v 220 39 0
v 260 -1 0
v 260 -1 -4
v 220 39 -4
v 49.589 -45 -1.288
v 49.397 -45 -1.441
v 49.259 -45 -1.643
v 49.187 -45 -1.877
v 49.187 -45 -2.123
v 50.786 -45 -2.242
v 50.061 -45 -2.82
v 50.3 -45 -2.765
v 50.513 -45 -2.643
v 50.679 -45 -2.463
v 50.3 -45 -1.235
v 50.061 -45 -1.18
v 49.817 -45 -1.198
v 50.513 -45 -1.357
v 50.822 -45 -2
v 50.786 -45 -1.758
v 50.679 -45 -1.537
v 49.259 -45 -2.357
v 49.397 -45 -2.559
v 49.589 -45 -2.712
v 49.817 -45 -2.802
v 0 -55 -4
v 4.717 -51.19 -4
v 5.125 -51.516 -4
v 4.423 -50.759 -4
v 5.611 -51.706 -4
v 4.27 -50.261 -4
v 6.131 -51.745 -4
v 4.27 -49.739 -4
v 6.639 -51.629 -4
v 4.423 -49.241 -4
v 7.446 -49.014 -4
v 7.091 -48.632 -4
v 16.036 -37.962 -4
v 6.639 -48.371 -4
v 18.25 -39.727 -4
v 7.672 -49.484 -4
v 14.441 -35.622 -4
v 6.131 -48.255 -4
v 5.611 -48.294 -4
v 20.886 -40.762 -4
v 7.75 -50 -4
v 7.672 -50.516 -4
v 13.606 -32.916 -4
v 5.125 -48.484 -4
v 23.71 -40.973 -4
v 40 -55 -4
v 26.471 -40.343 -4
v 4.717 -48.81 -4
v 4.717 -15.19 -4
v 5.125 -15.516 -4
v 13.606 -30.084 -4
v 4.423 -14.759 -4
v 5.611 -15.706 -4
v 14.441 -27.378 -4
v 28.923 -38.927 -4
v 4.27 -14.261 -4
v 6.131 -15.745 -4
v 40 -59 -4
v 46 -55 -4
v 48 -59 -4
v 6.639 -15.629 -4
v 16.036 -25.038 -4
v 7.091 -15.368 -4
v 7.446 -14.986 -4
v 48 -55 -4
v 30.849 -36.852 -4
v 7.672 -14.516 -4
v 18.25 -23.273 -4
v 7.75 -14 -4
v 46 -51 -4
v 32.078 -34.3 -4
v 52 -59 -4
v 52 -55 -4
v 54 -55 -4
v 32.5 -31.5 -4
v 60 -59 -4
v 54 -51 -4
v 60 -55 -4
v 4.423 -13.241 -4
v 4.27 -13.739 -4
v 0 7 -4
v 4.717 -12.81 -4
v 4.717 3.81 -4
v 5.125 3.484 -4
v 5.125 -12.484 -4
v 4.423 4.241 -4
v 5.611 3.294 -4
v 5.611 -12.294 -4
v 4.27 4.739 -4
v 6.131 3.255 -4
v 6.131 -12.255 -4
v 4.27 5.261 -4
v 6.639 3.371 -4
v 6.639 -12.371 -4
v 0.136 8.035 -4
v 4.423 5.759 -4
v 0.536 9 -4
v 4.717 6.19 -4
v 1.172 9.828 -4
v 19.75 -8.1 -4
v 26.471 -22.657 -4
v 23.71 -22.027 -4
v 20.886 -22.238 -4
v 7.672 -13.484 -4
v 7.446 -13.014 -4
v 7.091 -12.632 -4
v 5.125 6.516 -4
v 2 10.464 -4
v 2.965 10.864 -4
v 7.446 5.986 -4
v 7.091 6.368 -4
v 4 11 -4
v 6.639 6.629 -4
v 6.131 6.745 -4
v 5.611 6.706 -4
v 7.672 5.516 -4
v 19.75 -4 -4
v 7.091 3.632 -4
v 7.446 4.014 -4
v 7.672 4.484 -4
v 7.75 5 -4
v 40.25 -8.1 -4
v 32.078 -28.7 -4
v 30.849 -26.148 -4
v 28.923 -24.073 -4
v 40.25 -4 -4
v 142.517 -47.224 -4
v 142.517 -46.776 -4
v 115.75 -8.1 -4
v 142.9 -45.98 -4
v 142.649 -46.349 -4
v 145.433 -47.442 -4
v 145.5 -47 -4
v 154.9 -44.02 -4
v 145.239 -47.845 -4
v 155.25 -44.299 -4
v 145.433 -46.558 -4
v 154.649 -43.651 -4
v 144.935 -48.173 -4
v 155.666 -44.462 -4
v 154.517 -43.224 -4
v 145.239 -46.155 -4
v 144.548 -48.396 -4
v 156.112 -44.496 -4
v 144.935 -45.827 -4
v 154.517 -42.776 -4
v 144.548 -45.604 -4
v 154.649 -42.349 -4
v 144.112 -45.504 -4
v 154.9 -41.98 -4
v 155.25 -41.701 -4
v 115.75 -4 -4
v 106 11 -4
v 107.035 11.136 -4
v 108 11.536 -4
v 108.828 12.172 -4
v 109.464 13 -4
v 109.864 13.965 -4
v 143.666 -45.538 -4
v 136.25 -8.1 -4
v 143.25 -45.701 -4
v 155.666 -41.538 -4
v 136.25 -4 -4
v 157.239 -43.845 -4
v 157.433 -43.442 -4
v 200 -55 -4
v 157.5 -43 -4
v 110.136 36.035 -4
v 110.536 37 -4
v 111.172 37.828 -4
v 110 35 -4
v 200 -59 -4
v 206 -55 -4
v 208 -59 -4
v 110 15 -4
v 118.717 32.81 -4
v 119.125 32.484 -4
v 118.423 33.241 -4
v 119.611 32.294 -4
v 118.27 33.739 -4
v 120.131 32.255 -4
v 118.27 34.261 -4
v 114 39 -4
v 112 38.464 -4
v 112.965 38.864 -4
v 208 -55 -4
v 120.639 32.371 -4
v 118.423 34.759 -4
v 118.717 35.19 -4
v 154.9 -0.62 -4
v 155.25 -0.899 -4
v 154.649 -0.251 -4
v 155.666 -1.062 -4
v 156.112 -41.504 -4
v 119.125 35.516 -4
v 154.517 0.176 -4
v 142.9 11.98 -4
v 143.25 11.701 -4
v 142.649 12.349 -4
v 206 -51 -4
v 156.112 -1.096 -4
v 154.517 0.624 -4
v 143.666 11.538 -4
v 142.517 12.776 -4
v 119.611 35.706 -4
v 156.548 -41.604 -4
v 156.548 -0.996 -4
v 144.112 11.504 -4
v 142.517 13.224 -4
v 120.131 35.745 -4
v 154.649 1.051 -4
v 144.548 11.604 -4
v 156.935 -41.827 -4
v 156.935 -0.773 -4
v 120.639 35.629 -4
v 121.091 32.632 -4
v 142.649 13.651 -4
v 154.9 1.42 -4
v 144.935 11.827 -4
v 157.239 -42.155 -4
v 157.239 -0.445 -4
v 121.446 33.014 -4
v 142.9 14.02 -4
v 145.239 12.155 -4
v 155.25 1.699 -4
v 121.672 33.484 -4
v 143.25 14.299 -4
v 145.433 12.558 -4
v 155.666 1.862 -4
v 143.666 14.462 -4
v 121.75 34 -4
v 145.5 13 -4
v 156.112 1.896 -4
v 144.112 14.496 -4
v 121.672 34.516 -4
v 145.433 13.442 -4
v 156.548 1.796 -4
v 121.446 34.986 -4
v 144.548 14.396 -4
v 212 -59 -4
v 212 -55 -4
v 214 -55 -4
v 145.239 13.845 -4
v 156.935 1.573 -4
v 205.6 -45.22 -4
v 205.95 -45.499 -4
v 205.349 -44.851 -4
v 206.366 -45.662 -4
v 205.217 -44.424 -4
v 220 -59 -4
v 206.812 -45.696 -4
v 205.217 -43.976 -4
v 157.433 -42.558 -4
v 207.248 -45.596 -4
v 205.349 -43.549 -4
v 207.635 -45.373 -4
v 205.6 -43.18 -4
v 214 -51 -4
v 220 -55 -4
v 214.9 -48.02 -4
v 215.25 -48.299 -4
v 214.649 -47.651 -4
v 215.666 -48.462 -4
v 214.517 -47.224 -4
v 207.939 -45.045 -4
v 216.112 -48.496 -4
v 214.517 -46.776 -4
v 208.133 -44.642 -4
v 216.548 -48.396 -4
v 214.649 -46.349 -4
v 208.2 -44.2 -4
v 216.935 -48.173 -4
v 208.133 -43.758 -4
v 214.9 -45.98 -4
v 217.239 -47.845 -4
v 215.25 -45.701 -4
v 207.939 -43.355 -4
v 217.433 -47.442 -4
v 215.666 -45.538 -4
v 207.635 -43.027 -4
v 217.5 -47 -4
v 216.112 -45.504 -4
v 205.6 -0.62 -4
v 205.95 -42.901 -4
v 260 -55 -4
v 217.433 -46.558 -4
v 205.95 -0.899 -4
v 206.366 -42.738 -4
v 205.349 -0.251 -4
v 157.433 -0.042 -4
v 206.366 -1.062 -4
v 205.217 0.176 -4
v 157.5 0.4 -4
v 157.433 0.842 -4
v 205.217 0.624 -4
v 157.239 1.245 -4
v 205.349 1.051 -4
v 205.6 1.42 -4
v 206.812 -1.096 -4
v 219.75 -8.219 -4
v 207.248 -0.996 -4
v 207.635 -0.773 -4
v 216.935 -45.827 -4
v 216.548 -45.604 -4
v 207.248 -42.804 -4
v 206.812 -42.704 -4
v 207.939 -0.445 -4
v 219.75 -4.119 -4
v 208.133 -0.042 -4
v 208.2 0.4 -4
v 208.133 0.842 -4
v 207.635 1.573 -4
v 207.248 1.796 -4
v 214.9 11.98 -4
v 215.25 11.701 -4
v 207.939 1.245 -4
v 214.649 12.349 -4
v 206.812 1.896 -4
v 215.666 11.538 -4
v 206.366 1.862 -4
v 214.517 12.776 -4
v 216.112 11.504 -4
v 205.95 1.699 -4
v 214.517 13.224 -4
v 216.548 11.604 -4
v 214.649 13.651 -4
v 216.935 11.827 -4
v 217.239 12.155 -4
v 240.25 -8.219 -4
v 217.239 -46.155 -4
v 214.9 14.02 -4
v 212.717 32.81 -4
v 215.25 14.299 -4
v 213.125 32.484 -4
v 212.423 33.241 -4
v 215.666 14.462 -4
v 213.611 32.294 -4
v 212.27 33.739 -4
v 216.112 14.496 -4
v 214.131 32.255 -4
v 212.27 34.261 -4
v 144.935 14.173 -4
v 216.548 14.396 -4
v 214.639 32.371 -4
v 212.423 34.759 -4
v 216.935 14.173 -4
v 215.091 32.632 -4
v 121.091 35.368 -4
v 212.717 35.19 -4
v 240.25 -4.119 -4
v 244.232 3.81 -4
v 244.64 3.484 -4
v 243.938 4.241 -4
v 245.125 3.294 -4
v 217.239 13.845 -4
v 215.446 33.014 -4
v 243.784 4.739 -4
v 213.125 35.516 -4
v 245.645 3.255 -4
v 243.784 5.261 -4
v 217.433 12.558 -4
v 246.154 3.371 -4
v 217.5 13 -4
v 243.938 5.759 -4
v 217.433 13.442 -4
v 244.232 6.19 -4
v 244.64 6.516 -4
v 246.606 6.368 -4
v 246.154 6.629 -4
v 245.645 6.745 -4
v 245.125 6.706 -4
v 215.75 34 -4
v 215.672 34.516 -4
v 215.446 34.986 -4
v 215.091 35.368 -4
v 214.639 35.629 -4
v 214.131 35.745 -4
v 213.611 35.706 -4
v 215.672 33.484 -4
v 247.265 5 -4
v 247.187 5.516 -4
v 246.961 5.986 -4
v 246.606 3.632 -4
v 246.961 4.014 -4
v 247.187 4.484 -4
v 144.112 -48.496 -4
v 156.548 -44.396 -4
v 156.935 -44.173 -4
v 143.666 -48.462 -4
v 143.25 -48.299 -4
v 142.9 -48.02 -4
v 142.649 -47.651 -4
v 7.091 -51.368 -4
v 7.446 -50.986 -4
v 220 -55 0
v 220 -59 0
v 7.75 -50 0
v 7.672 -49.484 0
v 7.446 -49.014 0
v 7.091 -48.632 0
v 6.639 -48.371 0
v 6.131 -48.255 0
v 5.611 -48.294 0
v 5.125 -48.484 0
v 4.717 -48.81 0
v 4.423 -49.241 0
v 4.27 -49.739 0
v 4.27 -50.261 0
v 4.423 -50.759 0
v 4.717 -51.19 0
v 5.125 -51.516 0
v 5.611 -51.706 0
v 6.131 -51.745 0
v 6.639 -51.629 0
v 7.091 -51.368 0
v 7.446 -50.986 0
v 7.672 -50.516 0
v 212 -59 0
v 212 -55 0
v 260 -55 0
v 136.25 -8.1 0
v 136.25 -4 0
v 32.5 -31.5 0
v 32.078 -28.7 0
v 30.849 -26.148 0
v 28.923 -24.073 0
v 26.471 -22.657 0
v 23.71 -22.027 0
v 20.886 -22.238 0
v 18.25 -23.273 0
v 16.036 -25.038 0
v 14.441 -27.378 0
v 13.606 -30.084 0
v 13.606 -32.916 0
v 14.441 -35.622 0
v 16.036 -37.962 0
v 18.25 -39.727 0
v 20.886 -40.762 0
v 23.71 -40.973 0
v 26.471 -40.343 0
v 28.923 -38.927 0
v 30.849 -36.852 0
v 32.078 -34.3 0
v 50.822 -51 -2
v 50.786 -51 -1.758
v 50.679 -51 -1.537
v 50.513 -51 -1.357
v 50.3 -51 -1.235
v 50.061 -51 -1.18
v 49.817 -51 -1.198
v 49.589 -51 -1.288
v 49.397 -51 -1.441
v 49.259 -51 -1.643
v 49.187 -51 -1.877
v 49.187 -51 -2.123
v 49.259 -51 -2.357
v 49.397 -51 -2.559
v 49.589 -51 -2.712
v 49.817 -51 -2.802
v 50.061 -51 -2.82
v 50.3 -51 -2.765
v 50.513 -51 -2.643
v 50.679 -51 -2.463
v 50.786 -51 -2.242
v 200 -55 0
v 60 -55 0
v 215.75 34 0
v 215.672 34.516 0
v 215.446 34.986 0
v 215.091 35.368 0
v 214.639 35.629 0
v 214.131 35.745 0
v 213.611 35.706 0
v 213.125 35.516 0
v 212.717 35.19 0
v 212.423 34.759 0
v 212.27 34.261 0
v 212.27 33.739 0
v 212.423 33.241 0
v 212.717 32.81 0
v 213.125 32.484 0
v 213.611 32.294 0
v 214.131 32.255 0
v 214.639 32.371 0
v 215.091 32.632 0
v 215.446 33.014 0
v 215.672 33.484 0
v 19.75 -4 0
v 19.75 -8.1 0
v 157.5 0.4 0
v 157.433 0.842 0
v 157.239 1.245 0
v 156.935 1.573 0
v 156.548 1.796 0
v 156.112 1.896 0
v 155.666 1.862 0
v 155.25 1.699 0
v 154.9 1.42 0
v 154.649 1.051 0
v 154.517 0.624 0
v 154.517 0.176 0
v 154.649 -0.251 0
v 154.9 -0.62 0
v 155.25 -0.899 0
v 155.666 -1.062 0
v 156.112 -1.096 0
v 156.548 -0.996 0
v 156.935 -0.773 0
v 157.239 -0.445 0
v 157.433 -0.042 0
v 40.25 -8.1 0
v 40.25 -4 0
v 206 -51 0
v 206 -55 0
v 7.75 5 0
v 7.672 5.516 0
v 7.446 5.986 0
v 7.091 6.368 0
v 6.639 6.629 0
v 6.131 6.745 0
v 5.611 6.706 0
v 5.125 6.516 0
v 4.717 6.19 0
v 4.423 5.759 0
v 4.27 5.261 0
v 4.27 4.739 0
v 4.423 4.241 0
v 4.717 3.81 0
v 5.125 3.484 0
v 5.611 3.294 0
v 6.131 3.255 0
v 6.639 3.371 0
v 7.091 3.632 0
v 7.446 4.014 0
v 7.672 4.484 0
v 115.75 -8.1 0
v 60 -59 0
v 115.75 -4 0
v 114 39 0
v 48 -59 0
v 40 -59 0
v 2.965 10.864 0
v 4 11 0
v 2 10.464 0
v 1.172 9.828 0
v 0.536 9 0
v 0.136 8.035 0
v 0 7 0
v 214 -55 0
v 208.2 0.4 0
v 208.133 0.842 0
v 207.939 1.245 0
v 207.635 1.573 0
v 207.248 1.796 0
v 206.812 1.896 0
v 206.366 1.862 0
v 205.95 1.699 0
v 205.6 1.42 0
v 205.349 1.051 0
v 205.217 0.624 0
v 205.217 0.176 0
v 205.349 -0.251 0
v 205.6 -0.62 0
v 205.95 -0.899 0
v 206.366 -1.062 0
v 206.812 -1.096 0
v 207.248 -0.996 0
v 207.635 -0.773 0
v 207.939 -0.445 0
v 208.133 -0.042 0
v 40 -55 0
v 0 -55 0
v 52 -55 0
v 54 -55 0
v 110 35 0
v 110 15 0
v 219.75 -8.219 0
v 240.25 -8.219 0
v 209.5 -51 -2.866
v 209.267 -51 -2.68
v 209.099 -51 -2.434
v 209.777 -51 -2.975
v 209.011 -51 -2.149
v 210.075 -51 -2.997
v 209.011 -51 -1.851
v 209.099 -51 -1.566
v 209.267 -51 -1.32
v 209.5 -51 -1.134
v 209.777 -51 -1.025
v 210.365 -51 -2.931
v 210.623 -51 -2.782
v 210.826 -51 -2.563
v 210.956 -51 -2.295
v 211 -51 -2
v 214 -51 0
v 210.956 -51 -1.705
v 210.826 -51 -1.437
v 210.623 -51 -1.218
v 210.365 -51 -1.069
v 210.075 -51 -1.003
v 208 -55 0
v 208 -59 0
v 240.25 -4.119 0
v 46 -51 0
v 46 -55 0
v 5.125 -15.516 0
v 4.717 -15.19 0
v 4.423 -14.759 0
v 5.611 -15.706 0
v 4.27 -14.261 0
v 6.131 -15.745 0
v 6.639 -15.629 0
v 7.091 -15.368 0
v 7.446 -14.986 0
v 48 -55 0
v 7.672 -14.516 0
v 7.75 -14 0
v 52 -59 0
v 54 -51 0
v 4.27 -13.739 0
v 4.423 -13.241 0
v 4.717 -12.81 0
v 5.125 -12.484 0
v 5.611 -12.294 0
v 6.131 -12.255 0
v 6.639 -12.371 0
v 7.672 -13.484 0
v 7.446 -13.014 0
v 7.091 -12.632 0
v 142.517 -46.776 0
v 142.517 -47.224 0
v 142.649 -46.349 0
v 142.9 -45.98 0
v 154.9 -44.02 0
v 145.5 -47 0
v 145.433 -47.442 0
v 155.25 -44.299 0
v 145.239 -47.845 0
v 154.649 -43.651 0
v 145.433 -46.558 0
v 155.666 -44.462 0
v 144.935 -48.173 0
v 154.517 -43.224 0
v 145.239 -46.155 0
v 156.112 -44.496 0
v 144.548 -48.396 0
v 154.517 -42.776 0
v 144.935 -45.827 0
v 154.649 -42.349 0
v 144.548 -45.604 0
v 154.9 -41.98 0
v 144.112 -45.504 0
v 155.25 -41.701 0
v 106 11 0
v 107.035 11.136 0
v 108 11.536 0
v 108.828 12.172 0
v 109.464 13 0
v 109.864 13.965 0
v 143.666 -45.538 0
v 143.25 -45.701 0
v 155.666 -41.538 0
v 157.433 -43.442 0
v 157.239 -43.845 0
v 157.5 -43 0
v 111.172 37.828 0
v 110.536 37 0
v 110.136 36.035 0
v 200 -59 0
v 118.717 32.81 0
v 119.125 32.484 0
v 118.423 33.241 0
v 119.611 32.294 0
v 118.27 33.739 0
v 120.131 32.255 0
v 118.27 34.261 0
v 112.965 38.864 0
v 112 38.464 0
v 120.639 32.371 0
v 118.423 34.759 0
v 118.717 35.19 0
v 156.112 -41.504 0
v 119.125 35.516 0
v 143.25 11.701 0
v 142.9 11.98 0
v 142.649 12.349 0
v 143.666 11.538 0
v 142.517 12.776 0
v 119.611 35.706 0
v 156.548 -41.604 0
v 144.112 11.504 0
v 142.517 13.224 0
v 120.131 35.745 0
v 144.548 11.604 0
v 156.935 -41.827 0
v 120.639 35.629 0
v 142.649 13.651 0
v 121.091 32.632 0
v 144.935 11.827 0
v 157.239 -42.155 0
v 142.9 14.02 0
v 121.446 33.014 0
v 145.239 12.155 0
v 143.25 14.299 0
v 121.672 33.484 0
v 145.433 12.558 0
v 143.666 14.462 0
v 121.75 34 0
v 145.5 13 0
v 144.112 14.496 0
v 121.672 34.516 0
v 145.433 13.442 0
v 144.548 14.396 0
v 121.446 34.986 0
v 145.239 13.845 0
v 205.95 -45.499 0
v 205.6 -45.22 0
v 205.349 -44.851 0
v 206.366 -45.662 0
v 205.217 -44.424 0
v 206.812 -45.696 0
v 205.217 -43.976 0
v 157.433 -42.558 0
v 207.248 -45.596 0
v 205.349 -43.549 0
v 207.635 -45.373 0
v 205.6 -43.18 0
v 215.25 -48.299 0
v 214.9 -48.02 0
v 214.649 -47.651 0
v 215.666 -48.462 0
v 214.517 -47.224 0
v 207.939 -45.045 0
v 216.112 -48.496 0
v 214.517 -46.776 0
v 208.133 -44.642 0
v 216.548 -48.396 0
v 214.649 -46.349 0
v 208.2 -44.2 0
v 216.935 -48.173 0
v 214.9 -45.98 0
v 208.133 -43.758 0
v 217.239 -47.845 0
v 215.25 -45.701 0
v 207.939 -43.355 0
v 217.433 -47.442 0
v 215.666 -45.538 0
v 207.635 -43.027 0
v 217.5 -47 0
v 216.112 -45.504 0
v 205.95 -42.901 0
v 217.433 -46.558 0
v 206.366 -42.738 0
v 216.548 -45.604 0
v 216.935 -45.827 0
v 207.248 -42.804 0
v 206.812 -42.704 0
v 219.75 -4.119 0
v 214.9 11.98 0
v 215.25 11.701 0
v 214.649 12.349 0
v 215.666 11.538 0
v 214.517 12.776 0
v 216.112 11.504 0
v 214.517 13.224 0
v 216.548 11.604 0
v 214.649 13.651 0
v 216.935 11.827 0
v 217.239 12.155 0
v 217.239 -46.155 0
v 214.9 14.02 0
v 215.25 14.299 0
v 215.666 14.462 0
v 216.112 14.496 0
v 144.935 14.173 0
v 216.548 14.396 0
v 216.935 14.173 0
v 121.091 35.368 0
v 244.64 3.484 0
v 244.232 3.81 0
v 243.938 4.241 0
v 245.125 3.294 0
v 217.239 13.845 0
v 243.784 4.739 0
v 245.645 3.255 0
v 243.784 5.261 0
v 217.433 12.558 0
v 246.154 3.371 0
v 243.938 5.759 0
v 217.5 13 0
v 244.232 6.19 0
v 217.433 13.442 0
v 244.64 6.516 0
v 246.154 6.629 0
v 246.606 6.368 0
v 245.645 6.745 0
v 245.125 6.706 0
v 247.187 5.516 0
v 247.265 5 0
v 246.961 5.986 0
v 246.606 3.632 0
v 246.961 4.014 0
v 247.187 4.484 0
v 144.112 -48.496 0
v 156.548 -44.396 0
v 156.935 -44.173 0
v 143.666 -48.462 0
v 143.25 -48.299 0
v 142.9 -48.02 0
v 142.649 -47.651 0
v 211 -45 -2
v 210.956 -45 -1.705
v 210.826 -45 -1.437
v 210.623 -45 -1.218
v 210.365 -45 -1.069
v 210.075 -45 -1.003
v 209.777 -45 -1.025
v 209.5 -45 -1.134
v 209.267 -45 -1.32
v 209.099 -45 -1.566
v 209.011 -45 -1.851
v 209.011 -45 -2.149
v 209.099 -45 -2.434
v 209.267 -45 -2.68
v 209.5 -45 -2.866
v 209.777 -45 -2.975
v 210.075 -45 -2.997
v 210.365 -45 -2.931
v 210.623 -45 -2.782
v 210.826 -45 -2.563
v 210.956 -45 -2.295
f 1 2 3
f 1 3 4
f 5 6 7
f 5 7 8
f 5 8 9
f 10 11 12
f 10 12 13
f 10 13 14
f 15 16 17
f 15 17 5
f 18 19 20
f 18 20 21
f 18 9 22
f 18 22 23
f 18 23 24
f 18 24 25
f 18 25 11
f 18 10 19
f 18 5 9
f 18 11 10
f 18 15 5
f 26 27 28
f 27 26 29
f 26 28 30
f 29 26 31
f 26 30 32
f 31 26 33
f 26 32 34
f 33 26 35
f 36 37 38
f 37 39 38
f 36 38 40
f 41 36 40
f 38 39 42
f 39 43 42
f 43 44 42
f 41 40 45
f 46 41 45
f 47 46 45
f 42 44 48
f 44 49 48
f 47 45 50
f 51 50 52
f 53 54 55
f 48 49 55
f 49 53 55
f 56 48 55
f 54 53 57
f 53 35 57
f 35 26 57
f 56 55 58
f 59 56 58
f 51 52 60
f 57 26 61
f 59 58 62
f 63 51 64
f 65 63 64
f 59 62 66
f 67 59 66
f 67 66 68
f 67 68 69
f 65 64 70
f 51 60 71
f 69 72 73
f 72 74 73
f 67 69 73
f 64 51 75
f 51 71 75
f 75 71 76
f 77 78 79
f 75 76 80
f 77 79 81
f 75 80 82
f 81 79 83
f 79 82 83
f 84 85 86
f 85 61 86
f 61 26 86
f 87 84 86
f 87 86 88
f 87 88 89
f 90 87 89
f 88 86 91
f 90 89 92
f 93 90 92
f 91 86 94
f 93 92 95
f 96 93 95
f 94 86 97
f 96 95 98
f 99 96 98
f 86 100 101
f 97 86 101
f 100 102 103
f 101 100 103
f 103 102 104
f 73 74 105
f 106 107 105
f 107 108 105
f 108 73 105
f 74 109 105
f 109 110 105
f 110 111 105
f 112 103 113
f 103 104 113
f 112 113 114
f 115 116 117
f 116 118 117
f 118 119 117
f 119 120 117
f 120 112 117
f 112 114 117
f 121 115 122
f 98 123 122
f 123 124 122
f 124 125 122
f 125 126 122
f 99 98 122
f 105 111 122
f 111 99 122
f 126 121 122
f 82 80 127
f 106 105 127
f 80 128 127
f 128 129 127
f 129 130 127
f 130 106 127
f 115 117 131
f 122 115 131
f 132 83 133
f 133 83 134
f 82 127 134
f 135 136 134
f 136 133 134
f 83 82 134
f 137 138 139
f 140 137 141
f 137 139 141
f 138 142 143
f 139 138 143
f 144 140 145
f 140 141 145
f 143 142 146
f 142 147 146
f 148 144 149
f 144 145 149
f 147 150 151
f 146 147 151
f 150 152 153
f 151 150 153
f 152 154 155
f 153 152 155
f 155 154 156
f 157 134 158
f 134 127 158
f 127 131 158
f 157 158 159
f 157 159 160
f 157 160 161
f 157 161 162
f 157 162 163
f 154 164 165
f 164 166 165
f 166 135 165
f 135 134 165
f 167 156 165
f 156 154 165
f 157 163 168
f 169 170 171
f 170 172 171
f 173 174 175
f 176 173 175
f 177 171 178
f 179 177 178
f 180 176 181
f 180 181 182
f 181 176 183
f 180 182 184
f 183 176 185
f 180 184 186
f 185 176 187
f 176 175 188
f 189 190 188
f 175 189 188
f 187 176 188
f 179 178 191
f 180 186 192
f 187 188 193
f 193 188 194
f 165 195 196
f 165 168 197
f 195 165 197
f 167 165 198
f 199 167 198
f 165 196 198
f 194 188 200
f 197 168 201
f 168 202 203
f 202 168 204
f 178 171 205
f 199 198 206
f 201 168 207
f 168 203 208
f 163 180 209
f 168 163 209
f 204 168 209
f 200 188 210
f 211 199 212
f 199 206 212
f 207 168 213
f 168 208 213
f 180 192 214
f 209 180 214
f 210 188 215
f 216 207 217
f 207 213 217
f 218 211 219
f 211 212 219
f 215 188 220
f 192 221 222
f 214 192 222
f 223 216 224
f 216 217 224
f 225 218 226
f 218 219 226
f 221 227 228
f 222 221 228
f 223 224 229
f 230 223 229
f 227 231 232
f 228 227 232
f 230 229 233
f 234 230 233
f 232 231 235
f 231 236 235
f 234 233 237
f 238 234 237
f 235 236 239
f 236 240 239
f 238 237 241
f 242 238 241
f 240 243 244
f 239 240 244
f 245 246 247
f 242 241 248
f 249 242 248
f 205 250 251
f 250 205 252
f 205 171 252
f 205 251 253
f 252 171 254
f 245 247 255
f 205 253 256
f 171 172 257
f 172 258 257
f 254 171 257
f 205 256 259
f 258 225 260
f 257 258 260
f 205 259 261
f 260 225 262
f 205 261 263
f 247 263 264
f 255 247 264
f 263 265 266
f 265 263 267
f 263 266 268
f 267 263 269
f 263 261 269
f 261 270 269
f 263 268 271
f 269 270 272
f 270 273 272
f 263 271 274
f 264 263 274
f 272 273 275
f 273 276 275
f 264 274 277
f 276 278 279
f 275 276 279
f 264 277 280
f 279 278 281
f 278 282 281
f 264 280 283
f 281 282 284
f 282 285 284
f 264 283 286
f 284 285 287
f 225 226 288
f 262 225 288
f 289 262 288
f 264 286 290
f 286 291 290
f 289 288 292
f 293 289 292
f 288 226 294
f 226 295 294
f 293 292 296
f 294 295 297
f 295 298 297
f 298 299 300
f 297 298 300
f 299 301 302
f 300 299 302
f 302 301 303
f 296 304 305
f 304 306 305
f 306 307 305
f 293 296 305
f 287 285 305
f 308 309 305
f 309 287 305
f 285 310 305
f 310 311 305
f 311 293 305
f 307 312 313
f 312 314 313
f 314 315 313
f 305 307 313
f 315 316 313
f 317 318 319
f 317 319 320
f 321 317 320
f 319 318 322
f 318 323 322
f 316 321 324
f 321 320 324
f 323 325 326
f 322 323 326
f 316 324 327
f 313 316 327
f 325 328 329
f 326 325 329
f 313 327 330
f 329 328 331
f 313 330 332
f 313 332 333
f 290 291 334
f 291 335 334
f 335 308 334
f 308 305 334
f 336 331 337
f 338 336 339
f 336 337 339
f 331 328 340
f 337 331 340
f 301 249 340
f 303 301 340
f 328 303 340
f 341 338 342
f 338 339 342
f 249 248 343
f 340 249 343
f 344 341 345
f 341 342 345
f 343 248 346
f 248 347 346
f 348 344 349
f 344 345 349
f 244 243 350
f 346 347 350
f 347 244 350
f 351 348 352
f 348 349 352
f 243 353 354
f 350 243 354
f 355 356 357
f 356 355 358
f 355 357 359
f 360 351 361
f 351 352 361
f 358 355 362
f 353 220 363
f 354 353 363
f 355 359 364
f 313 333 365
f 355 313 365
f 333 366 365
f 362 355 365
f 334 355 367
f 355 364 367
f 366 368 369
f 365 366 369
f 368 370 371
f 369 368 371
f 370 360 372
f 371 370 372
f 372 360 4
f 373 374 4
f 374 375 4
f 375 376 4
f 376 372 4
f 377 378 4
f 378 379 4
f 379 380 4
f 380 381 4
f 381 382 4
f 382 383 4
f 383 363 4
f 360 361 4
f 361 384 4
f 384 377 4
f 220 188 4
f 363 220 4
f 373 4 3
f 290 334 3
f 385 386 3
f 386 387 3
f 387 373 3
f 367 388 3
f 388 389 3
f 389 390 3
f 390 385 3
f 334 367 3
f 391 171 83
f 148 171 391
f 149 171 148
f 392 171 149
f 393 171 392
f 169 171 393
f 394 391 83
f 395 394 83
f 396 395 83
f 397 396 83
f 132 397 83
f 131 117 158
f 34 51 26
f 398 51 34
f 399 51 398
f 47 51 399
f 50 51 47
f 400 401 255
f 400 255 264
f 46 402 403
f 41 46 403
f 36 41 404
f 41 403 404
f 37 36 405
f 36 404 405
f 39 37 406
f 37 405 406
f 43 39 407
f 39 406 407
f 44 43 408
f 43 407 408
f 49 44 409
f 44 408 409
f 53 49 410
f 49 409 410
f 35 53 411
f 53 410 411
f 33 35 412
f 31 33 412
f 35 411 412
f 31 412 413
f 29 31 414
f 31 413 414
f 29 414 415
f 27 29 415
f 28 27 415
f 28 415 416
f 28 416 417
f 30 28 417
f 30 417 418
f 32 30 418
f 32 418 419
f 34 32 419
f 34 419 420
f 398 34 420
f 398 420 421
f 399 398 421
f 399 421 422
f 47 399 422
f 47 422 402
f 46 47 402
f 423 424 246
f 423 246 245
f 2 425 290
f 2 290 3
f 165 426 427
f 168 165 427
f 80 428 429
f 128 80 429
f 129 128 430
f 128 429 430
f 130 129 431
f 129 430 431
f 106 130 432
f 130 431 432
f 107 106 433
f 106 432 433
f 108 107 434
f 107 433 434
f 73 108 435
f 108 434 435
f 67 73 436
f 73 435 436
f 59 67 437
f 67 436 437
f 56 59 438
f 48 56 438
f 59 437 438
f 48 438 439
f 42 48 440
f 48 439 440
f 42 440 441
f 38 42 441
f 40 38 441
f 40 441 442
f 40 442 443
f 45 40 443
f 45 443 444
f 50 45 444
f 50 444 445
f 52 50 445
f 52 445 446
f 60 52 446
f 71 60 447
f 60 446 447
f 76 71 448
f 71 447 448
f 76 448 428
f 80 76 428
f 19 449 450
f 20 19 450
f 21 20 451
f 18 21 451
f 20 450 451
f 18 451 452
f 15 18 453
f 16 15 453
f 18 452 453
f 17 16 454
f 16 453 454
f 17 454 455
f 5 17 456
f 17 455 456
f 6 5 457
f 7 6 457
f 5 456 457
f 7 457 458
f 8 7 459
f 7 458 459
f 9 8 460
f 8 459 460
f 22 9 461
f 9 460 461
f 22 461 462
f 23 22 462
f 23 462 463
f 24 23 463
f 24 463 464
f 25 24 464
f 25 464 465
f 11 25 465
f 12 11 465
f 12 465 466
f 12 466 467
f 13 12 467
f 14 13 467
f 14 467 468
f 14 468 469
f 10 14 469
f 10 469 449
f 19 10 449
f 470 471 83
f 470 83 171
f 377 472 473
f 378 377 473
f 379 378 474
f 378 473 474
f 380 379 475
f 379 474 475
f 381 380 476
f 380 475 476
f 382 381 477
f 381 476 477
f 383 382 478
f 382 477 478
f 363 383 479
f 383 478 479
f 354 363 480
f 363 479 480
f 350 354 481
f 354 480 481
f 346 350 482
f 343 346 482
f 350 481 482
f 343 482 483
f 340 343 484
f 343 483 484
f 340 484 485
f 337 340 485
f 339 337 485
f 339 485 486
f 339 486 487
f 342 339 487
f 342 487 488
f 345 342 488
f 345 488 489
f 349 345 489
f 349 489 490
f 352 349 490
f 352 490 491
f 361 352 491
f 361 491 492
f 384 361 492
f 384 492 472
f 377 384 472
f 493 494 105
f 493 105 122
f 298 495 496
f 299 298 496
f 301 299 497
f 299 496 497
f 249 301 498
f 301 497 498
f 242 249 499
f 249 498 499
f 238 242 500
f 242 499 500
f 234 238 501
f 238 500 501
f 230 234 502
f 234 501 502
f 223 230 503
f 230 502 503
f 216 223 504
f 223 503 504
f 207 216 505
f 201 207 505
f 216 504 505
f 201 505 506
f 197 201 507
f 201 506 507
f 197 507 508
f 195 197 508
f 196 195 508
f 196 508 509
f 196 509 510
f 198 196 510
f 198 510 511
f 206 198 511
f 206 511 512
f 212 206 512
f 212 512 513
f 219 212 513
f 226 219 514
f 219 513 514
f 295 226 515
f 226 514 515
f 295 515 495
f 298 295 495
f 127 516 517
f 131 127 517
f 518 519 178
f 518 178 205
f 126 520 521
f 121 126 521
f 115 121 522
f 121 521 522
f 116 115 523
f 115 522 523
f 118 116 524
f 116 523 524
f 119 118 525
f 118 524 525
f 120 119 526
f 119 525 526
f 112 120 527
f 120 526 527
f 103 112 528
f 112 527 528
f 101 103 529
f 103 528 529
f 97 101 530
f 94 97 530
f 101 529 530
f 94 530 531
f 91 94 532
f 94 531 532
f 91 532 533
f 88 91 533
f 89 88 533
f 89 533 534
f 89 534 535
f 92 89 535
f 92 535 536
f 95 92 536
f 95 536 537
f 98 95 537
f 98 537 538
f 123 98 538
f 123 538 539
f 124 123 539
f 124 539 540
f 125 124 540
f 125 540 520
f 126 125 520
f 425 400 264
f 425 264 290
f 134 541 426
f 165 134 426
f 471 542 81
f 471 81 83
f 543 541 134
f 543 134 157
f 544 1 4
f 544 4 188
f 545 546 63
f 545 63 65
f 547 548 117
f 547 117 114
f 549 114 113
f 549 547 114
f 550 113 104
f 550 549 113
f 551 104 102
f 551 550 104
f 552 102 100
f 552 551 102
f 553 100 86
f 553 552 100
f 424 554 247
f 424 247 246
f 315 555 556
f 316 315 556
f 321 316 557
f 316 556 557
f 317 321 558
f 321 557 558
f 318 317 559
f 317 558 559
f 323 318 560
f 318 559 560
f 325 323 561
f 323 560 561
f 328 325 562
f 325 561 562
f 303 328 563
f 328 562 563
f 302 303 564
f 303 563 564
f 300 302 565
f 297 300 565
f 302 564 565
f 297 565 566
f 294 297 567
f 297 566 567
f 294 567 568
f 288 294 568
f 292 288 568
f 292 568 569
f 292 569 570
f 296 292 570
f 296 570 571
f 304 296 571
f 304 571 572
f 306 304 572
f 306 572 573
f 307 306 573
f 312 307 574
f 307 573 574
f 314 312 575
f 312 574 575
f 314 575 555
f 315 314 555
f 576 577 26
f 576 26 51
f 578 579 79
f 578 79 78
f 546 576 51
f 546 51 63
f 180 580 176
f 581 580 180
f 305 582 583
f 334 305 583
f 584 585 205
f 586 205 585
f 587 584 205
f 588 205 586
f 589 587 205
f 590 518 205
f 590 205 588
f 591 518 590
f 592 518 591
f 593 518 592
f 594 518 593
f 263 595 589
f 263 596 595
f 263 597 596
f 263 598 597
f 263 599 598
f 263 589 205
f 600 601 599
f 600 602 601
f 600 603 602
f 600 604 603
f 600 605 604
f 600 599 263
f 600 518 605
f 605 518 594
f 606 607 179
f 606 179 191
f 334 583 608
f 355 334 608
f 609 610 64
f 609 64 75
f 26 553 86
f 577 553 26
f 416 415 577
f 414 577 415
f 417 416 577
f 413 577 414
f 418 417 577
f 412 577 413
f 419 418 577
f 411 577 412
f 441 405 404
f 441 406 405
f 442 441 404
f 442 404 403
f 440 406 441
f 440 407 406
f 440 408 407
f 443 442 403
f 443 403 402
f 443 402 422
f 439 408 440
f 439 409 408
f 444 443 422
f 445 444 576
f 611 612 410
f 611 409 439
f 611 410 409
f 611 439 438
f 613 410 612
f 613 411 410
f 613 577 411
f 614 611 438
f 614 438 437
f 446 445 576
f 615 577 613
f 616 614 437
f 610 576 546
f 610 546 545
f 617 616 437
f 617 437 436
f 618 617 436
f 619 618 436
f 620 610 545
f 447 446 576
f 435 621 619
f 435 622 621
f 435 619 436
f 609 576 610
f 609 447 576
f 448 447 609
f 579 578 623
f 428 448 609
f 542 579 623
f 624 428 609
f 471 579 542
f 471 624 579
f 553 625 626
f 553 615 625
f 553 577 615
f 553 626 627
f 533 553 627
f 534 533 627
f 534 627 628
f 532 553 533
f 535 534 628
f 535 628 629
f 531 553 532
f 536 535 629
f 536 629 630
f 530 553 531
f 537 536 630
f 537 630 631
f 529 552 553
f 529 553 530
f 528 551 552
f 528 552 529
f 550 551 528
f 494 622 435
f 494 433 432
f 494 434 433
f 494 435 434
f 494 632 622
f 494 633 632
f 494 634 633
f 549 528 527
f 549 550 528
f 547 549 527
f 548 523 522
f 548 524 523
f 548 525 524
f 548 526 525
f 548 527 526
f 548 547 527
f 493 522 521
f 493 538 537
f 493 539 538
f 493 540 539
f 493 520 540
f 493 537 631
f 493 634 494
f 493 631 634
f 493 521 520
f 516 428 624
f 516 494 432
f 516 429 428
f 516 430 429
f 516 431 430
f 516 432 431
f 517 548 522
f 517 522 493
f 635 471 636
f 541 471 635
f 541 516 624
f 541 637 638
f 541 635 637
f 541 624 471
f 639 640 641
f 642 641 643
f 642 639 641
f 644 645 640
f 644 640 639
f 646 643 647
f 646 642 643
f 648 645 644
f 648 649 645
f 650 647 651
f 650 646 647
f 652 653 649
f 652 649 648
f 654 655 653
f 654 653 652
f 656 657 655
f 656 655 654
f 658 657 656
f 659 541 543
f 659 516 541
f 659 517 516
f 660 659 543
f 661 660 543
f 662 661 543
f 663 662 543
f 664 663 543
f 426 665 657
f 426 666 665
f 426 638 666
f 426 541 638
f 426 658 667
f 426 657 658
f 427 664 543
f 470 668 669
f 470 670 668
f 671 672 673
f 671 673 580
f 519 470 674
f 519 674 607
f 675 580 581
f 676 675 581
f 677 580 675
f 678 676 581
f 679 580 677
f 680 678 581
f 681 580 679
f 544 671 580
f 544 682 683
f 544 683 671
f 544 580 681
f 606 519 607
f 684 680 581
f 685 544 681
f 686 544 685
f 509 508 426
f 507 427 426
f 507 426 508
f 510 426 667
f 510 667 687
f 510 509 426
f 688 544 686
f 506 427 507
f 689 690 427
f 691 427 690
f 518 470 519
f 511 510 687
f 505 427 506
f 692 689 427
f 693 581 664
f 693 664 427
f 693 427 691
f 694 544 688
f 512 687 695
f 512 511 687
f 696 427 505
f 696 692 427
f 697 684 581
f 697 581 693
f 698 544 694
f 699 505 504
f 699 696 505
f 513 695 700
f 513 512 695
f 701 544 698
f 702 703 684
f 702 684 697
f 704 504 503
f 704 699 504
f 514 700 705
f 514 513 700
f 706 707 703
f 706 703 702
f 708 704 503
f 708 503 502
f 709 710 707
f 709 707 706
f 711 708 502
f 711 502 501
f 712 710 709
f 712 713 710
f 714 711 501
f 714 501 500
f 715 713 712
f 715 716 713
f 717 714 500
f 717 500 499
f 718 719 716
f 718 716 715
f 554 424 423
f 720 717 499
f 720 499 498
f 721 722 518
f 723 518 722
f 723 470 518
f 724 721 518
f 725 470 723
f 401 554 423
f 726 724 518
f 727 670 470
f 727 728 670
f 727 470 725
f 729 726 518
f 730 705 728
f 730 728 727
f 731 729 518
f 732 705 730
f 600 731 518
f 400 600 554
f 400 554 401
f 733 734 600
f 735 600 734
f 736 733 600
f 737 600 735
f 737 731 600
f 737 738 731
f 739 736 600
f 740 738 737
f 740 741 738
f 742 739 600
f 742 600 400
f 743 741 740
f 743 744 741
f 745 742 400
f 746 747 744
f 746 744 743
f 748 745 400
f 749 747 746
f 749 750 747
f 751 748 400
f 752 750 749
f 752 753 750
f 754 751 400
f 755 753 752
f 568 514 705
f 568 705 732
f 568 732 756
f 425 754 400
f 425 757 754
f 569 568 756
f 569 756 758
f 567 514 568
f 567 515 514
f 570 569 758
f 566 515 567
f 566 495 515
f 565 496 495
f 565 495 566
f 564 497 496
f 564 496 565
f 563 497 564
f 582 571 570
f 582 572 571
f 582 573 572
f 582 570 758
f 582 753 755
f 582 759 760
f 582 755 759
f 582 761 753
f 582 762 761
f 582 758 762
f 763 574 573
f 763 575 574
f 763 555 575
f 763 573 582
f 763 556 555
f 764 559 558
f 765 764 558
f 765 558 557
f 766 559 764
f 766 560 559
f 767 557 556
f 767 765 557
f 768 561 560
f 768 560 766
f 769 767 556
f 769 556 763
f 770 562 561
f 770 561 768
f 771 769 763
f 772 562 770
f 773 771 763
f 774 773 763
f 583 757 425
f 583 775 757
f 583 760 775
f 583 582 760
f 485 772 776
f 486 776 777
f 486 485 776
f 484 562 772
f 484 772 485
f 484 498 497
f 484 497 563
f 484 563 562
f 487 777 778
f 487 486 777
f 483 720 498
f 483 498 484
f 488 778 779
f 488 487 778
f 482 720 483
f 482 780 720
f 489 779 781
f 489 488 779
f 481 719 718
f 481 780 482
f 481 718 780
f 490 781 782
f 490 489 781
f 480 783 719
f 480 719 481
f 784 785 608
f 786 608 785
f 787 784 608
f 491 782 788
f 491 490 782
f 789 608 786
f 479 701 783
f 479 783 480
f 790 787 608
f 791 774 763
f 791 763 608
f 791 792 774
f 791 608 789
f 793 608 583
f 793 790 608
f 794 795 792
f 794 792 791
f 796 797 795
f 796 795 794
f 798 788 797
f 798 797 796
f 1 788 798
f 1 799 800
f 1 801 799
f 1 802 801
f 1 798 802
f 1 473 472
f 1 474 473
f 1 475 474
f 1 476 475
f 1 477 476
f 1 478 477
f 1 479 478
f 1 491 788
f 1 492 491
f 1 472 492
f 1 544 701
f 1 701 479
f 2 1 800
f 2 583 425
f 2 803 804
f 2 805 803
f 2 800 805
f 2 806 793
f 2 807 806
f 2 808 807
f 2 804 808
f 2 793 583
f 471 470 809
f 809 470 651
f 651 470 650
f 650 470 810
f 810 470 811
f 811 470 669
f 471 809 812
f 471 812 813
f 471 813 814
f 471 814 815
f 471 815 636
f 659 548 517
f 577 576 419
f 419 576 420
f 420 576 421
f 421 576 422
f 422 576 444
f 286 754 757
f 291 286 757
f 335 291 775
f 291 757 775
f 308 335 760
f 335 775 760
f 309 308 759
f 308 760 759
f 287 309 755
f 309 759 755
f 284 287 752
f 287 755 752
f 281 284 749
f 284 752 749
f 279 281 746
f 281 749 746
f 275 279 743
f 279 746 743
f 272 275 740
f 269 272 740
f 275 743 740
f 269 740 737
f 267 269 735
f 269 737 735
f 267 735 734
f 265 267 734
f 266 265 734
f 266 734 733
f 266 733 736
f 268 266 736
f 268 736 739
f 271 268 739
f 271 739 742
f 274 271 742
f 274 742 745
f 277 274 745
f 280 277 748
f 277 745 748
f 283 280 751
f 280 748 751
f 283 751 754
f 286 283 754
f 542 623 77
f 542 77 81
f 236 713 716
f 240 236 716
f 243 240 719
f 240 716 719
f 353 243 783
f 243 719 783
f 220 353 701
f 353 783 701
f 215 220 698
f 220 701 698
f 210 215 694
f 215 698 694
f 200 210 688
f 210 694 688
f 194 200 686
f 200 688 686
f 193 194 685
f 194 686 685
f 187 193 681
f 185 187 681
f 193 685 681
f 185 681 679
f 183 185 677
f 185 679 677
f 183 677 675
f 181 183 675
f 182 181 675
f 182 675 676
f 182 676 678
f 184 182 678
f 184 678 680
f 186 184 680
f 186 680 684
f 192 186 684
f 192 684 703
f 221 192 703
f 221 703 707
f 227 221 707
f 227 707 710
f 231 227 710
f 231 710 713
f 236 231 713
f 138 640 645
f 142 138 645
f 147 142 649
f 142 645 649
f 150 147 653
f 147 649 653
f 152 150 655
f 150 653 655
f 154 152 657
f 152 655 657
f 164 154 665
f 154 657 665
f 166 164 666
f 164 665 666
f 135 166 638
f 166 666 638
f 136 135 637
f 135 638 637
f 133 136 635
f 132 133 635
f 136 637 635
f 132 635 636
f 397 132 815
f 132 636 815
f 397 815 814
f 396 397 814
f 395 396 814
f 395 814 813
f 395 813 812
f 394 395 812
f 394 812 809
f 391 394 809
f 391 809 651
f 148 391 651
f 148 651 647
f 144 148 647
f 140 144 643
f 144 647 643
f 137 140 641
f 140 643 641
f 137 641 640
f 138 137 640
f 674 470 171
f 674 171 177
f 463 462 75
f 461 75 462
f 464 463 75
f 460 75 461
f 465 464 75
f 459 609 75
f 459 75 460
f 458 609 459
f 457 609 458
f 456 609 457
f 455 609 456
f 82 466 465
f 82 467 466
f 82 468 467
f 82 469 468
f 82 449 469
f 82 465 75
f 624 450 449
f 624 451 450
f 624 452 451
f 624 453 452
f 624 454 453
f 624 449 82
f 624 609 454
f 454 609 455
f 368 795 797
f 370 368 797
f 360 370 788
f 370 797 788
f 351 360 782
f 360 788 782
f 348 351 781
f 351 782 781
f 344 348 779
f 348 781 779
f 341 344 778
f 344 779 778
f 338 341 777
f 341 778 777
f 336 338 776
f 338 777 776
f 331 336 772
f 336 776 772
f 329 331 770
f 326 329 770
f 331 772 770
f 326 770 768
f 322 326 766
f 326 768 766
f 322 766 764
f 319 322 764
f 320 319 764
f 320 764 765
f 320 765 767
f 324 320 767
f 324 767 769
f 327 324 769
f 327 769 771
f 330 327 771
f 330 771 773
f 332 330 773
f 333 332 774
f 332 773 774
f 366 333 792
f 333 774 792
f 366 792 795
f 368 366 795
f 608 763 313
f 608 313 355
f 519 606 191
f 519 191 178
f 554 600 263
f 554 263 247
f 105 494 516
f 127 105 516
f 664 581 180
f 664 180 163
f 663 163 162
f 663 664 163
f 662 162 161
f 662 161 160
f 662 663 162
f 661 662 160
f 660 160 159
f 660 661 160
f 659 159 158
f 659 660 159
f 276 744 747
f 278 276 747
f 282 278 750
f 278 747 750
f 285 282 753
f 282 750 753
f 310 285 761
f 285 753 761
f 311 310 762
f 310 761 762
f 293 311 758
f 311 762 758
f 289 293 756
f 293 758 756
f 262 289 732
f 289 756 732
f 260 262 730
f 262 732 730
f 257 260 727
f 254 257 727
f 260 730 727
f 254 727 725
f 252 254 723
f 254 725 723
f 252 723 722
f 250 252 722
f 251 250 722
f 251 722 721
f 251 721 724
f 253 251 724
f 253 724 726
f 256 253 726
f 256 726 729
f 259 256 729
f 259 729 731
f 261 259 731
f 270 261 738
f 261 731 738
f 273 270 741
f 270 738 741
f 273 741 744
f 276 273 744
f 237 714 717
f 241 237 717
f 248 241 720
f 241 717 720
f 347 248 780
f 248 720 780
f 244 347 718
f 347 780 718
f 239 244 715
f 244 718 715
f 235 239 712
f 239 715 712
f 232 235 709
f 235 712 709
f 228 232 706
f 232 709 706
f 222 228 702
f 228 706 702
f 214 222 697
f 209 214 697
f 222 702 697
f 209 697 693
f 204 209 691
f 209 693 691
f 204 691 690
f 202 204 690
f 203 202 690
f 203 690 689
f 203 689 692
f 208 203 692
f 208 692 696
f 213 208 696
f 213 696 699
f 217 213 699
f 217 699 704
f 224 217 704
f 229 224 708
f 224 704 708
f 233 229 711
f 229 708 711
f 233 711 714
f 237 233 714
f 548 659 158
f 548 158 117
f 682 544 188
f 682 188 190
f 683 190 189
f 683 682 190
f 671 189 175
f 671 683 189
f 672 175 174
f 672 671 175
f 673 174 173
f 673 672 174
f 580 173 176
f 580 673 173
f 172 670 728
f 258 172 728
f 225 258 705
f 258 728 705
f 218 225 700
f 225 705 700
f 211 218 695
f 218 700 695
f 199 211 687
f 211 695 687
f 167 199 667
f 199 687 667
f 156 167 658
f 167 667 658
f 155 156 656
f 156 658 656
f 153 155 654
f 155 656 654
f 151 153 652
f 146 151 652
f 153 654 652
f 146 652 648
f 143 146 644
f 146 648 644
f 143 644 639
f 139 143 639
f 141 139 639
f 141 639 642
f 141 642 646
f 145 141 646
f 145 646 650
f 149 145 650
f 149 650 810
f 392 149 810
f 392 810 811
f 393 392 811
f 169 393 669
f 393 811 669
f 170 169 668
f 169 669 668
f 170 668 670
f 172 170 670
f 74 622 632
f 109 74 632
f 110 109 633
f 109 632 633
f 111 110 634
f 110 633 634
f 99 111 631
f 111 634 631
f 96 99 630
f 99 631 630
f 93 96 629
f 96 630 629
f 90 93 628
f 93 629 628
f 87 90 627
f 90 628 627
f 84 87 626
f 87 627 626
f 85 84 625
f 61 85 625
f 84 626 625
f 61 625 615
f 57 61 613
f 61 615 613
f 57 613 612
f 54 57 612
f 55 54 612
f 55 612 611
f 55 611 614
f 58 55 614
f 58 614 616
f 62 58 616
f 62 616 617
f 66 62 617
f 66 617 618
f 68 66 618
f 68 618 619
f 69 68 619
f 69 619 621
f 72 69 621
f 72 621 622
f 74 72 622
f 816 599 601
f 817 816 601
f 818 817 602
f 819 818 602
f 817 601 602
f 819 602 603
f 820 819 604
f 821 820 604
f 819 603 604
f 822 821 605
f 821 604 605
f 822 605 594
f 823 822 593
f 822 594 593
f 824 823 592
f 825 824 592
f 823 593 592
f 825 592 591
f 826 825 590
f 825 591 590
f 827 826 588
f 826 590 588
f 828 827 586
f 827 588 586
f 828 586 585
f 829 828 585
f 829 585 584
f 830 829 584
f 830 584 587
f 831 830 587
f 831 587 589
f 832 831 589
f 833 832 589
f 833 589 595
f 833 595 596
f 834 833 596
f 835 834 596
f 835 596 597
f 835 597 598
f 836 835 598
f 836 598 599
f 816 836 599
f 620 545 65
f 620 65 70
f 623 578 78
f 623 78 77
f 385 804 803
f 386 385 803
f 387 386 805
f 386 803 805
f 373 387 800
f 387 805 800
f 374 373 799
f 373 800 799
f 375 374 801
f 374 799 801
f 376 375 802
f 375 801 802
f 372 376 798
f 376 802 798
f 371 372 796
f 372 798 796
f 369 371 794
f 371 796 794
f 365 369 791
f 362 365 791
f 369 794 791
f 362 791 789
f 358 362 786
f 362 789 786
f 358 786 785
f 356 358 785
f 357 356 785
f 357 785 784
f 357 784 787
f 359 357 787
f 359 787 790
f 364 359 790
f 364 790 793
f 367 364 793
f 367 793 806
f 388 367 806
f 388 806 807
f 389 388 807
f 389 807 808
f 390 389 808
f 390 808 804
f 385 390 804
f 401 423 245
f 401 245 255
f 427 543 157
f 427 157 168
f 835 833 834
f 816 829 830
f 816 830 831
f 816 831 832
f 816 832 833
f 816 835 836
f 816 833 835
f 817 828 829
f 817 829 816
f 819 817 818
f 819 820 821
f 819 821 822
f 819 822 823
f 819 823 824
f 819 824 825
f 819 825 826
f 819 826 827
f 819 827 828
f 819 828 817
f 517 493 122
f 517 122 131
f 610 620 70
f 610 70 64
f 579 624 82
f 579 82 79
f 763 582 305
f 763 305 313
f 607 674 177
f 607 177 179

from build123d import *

# Parameters (mm, degrees)
SKETCH_1_R             = 9.5
SKETCH_1_R_2           = 1.5
SKETCH_1_W             = 20.5
SKETCH_1_H             = 4.1
SM_BASE_FLANGE_1_DEPTH = 4
SKETCH_6_R             = 1.75
CUT_EXTRUDE_1_DEPTH    = 267.640207021
SKETCH_8_R             = 1
SKETCH_8_R_2           = 0.822154456
CUT_EXTRUDE_3_DEPTH    = 10


# Sheet-metal steps are written as plain solids
with BuildPart() as part:
    # Sketch 1 → Базовая кромка1 (new body)
    with BuildSketch(Plane.XY):
        with BuildLine():
            Line((52, -59), (60, -59))
            Line((60, -59), (60, -55))
            Line((60, -55), (200, -55))
            Line((200, -55), (200, -59))
            Line((200, -59), (208, -59))
            Line((208, -59), (208, -55))
            Line((208, -55), (206, -55))
            Line((206, -55), (206, -51))
            Line((206, -51), (214, -51))
            Line((214, -51), (214, -55))
            Line((214, -55), (212, -55))
            Line((212, -55), (212, -59))
            Line((212, -59), (220, -59))
            Line((220, -59), (220, -55))
            Line((220, -55), (260, -55))
            Line((260, -55), (260, -1))
            Line((260, -1), (220, 39))
            Line((220, 39), (120, 39))
            Line((120, 39), (114, 39))
            ThreePointArc((114, 39), (111.171572875, 37.828427125), (110, 35))
            Line((110, 35), (110, 15))
            ThreePointArc((110, 15), (108.828427125, 12.171572875), (106, 11))
            Line((106, 11), (4, 11))
            ThreePointArc((4, 11), (1.171572875, 9.828427125), (0, 7))
            Line((0, 7), (0, 0))
            Line((0, 0), (0, -55))
            Line((0, -55), (40, -55))
            Line((40, -55), (40, -59))
            Line((40, -59), (48, -59))
            Line((48, -59), (48, -55))
            Line((48, -55), (46, -55))
            Line((46, -55), (46, -51))
            Line((46, -51), (54, -51))
            Line((54, -51), (54, -55))
            Line((54, -55), (52, -55))
            Line((52, -55), (52, -59))
        make_face()
        with Locations((23, -31.5)):
            Circle(SKETCH_1_R, mode=Mode.SUBTRACT)
        with Locations((156, -43)):
            Circle(SKETCH_1_R_2, mode=Mode.SUBTRACT)
        with Locations((206.7, 0.4)):
            Circle(SKETCH_1_R_2, mode=Mode.SUBTRACT)
        with Locations((156, 0.4)):
            Circle(SKETCH_1_R_2, mode=Mode.SUBTRACT)
        with Locations((206.7, -44.2)):
            Circle(SKETCH_1_R_2, mode=Mode.SUBTRACT)
        with Locations((144, -47)):
            Circle(SKETCH_1_R_2, mode=Mode.SUBTRACT)
        with Locations((216, -47)):
            Circle(SKETCH_1_R_2, mode=Mode.SUBTRACT)
        with Locations((216, 13)):
            Circle(SKETCH_1_R_2, mode=Mode.SUBTRACT)
        with Locations((144, 13)):
            Circle(SKETCH_1_R_2, mode=Mode.SUBTRACT)
        with Locations((30, -6.05)):
            Rectangle(SKETCH_1_W, SKETCH_1_H, mode=Mode.SUBTRACT)
        with Locations((230, -6.169027082)):
            Rectangle(SKETCH_1_W, SKETCH_1_H, mode=Mode.SUBTRACT)
        with Locations((126, -6.05)):
            Rectangle(SKETCH_1_W, SKETCH_1_H, mode=Mode.SUBTRACT)
    extrude(amount=-SM_BASE_FLANGE_1_DEPTH)

    # Эскиз6 → Вырез-Вытянуть1 (cut, through all)
    with BuildSketch(Plane.XY):
        with Locations((6, 5)):
            Circle(SKETCH_6_R)
        with Locations((120, 34)):
            Circle(SKETCH_6_R)
        with Locations((214, 34)):
            Circle(SKETCH_6_R)
        with Locations((245.514718626, 5)):
            Circle(SKETCH_6_R)
        with Locations((6, -14)):
            Circle(SKETCH_6_R)
        with Locations((6, -50)):
            Circle(SKETCH_6_R)
    extrude(amount=-CUT_EXTRUDE_1_DEPTH, mode=Mode.SUBTRACT)

    # Эскиз8 → Вырез-Вытянуть3 (cut)
    with BuildSketch(Plane.XZ.offset(55)):
        with Locations((210, -2)):
            Circle(SKETCH_8_R)
        with Locations((50, -2)):
            Circle(SKETCH_8_R_2)
    extrude(amount=-CUT_EXTRUDE_3_DEPTH, mode=Mode.SUBTRACT)


solid = part.part
